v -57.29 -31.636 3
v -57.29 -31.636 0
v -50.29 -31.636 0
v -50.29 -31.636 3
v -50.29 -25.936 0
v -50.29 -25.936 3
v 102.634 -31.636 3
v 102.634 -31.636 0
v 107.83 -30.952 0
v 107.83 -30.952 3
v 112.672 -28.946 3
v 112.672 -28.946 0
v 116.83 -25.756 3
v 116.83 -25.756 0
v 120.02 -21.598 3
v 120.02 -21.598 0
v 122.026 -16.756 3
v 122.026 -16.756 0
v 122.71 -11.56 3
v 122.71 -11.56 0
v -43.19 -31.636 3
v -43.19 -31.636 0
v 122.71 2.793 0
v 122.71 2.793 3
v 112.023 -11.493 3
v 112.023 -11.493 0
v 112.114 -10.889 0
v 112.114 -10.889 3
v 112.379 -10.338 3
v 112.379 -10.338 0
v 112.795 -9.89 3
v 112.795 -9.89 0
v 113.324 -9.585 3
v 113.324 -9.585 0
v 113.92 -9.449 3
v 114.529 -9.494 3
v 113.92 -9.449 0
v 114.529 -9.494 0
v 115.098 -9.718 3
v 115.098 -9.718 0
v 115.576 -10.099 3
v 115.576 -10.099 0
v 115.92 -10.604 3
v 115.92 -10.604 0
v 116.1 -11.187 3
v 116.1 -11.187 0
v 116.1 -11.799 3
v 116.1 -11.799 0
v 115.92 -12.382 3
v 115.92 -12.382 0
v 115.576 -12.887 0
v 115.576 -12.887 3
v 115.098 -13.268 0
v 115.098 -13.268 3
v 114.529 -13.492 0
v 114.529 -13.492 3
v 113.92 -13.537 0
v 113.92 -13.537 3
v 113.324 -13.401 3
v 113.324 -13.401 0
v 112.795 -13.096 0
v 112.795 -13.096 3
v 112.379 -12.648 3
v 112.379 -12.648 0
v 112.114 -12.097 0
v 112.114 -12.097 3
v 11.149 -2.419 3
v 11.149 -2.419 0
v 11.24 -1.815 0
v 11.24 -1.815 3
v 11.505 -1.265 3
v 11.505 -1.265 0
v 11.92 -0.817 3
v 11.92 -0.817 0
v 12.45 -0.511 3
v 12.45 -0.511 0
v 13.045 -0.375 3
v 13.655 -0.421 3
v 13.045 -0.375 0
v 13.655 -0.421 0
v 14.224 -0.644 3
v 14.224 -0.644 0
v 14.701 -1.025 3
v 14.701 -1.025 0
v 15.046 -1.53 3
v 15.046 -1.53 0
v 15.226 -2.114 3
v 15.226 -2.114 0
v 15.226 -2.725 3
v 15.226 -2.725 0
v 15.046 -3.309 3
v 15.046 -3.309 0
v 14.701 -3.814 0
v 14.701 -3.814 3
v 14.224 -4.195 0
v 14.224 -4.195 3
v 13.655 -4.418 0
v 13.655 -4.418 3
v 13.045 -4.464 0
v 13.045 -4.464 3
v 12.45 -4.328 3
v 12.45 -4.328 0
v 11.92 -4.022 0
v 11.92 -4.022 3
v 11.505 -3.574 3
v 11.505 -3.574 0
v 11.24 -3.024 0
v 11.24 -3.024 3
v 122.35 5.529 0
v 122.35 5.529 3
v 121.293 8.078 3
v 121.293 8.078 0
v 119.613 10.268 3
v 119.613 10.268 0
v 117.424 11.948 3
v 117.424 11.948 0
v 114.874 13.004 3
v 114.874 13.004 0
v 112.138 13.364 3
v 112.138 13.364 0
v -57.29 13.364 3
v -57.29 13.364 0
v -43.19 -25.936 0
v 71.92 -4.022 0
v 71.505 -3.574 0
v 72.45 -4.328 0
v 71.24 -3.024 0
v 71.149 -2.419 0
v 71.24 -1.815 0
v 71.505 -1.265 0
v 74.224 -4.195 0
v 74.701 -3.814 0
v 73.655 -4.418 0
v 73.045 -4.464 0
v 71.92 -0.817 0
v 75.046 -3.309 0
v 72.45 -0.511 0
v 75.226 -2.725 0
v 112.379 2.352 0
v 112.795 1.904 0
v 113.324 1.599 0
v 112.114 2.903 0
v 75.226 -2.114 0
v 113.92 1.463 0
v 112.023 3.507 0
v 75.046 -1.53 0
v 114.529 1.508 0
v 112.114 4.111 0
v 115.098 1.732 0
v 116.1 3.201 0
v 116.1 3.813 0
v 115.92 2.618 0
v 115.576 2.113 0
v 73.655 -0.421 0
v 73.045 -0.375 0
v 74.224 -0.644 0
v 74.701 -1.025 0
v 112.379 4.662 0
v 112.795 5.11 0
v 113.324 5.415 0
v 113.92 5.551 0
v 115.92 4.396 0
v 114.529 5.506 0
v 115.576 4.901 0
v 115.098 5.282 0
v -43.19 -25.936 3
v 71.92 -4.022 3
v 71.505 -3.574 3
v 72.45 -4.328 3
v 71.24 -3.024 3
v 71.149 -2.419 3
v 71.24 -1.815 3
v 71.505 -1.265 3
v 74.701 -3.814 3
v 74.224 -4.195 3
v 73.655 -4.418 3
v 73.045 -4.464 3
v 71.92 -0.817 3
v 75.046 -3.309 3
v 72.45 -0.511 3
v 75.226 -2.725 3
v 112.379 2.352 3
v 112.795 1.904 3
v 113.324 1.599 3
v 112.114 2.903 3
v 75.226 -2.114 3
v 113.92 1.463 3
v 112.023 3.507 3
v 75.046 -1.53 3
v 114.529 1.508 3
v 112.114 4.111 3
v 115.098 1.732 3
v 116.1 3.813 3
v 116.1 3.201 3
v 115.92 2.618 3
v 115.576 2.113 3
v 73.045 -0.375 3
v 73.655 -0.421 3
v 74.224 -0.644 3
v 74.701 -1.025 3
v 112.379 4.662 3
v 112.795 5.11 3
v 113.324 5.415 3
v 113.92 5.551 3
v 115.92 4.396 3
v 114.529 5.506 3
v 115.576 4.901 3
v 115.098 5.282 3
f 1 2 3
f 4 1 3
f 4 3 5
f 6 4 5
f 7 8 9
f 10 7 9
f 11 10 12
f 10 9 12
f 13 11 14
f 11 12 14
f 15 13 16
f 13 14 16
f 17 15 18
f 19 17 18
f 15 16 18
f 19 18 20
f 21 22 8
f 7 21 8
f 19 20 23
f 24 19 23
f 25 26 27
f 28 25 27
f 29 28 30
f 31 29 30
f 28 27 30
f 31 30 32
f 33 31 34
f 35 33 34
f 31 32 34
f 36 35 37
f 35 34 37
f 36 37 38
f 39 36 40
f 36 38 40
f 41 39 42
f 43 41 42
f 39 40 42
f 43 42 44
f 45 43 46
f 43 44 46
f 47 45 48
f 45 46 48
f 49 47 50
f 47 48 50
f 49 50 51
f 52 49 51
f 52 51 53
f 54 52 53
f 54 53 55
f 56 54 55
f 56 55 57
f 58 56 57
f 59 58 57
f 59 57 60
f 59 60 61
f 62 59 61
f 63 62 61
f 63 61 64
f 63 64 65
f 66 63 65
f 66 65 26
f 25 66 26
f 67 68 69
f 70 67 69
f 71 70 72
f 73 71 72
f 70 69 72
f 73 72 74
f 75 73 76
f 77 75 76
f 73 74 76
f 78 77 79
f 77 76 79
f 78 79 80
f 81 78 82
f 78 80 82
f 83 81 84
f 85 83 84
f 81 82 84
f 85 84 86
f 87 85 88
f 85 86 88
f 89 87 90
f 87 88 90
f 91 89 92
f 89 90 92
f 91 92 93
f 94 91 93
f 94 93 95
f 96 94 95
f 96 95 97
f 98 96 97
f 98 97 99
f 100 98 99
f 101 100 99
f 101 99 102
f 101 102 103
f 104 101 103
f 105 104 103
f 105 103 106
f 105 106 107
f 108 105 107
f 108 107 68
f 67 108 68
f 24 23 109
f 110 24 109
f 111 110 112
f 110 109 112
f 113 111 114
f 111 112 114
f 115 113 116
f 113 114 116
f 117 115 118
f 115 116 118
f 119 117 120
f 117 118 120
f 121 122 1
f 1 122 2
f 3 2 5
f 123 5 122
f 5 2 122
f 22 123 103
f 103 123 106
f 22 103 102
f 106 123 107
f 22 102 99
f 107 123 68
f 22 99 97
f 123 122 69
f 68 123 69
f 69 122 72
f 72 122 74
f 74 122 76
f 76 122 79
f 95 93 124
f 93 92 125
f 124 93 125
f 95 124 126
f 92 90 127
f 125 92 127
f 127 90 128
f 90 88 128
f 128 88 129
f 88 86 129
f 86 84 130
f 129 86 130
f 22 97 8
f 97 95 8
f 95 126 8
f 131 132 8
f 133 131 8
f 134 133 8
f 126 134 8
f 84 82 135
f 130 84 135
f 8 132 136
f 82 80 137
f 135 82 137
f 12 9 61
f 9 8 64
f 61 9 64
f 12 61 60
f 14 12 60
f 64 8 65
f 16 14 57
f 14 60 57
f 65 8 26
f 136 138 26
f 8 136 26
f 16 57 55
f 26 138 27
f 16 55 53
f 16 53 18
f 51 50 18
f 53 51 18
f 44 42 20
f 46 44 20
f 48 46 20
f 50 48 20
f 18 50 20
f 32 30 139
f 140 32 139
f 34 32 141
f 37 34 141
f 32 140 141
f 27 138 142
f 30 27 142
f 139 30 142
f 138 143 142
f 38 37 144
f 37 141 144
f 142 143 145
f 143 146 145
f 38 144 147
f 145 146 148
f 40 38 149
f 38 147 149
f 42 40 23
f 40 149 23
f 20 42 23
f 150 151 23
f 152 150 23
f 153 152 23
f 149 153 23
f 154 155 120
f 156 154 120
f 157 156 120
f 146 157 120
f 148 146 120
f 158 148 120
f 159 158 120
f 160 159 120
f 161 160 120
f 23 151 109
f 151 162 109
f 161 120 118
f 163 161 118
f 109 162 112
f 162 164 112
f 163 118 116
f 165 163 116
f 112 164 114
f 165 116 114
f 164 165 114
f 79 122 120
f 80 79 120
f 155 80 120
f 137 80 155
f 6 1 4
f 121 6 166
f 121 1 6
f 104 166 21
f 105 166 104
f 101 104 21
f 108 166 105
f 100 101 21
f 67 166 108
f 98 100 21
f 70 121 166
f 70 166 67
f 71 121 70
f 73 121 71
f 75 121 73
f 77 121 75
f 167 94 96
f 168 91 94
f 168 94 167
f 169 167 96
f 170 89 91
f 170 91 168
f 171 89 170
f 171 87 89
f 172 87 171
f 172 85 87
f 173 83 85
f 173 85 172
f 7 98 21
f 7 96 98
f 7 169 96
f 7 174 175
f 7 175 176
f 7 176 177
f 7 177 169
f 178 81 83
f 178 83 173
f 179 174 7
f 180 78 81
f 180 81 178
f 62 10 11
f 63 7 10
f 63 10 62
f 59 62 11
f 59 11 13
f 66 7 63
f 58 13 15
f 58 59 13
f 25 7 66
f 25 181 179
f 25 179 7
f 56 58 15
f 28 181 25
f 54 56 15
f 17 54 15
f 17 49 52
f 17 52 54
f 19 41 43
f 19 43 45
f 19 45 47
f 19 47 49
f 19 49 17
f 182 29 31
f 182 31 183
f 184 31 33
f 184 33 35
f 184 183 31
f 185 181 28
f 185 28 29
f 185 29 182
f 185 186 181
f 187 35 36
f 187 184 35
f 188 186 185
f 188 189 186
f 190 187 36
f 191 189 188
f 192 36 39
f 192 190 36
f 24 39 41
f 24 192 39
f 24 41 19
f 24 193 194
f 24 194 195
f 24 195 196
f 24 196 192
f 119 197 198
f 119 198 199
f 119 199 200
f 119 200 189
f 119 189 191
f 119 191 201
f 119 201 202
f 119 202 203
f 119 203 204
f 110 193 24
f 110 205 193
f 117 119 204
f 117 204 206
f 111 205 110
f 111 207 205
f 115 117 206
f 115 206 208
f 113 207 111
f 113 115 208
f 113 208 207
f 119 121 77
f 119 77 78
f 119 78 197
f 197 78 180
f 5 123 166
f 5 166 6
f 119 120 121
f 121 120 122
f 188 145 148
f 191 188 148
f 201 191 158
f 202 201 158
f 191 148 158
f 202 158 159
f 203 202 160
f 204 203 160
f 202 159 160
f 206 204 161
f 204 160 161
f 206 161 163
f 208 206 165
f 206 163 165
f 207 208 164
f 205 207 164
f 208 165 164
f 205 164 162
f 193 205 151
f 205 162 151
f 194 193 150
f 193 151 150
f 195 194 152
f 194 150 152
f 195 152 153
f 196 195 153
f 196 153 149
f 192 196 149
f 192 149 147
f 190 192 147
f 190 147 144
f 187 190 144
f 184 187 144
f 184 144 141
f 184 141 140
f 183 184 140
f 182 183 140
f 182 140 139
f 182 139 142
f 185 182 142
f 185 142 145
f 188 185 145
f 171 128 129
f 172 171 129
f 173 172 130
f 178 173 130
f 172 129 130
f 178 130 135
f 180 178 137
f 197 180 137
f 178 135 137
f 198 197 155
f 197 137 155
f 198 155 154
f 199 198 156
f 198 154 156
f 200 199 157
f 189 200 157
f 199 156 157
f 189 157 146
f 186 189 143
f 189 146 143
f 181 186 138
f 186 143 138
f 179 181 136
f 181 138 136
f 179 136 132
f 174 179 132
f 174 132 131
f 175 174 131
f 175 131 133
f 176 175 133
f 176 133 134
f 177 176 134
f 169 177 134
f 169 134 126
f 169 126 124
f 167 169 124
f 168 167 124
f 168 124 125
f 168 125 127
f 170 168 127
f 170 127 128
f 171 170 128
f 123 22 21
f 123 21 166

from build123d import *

# Parameters (mm, degrees)
EXTRUDE_1_DEPTH     = 3
SKETCH_2_W          = 7.1
SKETCH_2_H          = 5.7
CUT_EXTRUDE_1_DEPTH = 127.757680391
SKETCH_3_R          = 2.05
CUT_EXTRUDE_2_DEPTH = 127.757680391


with BuildPart() as part:
    # 스케치1 → 보스-돌출1 (new body)
    with BuildSketch(Plane.XY):
        with BuildLine():
            Line((77.962543428, 13.364192405), (-57.290239933, 13.364192405))
            Line((-57.290239933, 13.364192405), (-57.290239933, 1.630404544))
            Line((-57.290239933, 1.630404544), (-57.290239933, -6.697716143))
            Line((-57.290239933, -6.697716143), (-57.290239933, -31.635807595))
            Line((-57.290239933, -31.635807595), (102.63413291, -31.635807595))
            ThreePointArc((102.63413291, -31.635807595), (116.82974501, -25.755792538), (122.709760067, -11.560180438))
            Line((122.709760067, -11.560180438), (122.709760067, 2.792586849))
            ThreePointArc((122.709760067, 2.792586849), (119.613408488, 10.267840825), (112.138154512, 13.364192405))
            Line((112.138154512, 13.364192405), (77.962543428, 13.364192405))
        make_face()
    extrude(amount=EXTRUDE_1_DEPTH)

    # 스케치2 → 컷-돌출1 (cut, through all)
    with BuildSketch(Plane(origin=(0, 0, 0), x_dir=(-1, 0, 0), z_dir=(0, 0, -1))):
        with Locations((46.740239933, -28.785807595)):
            Rectangle(SKETCH_2_W, SKETCH_2_H)
    extrude(amount=-CUT_EXTRUDE_1_DEPTH, mode=Mode.SUBTRACT)

    # 스케치3 → 컷-돌출2 (cut, through all)
    with BuildSketch(Plane(origin=(0, 0, 0), x_dir=(-1, 0, 0), z_dir=(0, 0, -1))):
        with Locations((-114.073037193, 3.507033956)):
            Circle(SKETCH_3_R)
        with Locations((-73.198629194, -2.419409625)):
            Circle(SKETCH_3_R)
        with Locations((-114.073037193, -11.492966044)):
            Circle(SKETCH_3_R)
        with Locations((-13.198629194, -2.419409625)):
            Circle(SKETCH_3_R)
    extrude(amount=-CUT_EXTRUDE_2_DEPTH, mode=Mode.SUBTRACT)


solid = part.part
